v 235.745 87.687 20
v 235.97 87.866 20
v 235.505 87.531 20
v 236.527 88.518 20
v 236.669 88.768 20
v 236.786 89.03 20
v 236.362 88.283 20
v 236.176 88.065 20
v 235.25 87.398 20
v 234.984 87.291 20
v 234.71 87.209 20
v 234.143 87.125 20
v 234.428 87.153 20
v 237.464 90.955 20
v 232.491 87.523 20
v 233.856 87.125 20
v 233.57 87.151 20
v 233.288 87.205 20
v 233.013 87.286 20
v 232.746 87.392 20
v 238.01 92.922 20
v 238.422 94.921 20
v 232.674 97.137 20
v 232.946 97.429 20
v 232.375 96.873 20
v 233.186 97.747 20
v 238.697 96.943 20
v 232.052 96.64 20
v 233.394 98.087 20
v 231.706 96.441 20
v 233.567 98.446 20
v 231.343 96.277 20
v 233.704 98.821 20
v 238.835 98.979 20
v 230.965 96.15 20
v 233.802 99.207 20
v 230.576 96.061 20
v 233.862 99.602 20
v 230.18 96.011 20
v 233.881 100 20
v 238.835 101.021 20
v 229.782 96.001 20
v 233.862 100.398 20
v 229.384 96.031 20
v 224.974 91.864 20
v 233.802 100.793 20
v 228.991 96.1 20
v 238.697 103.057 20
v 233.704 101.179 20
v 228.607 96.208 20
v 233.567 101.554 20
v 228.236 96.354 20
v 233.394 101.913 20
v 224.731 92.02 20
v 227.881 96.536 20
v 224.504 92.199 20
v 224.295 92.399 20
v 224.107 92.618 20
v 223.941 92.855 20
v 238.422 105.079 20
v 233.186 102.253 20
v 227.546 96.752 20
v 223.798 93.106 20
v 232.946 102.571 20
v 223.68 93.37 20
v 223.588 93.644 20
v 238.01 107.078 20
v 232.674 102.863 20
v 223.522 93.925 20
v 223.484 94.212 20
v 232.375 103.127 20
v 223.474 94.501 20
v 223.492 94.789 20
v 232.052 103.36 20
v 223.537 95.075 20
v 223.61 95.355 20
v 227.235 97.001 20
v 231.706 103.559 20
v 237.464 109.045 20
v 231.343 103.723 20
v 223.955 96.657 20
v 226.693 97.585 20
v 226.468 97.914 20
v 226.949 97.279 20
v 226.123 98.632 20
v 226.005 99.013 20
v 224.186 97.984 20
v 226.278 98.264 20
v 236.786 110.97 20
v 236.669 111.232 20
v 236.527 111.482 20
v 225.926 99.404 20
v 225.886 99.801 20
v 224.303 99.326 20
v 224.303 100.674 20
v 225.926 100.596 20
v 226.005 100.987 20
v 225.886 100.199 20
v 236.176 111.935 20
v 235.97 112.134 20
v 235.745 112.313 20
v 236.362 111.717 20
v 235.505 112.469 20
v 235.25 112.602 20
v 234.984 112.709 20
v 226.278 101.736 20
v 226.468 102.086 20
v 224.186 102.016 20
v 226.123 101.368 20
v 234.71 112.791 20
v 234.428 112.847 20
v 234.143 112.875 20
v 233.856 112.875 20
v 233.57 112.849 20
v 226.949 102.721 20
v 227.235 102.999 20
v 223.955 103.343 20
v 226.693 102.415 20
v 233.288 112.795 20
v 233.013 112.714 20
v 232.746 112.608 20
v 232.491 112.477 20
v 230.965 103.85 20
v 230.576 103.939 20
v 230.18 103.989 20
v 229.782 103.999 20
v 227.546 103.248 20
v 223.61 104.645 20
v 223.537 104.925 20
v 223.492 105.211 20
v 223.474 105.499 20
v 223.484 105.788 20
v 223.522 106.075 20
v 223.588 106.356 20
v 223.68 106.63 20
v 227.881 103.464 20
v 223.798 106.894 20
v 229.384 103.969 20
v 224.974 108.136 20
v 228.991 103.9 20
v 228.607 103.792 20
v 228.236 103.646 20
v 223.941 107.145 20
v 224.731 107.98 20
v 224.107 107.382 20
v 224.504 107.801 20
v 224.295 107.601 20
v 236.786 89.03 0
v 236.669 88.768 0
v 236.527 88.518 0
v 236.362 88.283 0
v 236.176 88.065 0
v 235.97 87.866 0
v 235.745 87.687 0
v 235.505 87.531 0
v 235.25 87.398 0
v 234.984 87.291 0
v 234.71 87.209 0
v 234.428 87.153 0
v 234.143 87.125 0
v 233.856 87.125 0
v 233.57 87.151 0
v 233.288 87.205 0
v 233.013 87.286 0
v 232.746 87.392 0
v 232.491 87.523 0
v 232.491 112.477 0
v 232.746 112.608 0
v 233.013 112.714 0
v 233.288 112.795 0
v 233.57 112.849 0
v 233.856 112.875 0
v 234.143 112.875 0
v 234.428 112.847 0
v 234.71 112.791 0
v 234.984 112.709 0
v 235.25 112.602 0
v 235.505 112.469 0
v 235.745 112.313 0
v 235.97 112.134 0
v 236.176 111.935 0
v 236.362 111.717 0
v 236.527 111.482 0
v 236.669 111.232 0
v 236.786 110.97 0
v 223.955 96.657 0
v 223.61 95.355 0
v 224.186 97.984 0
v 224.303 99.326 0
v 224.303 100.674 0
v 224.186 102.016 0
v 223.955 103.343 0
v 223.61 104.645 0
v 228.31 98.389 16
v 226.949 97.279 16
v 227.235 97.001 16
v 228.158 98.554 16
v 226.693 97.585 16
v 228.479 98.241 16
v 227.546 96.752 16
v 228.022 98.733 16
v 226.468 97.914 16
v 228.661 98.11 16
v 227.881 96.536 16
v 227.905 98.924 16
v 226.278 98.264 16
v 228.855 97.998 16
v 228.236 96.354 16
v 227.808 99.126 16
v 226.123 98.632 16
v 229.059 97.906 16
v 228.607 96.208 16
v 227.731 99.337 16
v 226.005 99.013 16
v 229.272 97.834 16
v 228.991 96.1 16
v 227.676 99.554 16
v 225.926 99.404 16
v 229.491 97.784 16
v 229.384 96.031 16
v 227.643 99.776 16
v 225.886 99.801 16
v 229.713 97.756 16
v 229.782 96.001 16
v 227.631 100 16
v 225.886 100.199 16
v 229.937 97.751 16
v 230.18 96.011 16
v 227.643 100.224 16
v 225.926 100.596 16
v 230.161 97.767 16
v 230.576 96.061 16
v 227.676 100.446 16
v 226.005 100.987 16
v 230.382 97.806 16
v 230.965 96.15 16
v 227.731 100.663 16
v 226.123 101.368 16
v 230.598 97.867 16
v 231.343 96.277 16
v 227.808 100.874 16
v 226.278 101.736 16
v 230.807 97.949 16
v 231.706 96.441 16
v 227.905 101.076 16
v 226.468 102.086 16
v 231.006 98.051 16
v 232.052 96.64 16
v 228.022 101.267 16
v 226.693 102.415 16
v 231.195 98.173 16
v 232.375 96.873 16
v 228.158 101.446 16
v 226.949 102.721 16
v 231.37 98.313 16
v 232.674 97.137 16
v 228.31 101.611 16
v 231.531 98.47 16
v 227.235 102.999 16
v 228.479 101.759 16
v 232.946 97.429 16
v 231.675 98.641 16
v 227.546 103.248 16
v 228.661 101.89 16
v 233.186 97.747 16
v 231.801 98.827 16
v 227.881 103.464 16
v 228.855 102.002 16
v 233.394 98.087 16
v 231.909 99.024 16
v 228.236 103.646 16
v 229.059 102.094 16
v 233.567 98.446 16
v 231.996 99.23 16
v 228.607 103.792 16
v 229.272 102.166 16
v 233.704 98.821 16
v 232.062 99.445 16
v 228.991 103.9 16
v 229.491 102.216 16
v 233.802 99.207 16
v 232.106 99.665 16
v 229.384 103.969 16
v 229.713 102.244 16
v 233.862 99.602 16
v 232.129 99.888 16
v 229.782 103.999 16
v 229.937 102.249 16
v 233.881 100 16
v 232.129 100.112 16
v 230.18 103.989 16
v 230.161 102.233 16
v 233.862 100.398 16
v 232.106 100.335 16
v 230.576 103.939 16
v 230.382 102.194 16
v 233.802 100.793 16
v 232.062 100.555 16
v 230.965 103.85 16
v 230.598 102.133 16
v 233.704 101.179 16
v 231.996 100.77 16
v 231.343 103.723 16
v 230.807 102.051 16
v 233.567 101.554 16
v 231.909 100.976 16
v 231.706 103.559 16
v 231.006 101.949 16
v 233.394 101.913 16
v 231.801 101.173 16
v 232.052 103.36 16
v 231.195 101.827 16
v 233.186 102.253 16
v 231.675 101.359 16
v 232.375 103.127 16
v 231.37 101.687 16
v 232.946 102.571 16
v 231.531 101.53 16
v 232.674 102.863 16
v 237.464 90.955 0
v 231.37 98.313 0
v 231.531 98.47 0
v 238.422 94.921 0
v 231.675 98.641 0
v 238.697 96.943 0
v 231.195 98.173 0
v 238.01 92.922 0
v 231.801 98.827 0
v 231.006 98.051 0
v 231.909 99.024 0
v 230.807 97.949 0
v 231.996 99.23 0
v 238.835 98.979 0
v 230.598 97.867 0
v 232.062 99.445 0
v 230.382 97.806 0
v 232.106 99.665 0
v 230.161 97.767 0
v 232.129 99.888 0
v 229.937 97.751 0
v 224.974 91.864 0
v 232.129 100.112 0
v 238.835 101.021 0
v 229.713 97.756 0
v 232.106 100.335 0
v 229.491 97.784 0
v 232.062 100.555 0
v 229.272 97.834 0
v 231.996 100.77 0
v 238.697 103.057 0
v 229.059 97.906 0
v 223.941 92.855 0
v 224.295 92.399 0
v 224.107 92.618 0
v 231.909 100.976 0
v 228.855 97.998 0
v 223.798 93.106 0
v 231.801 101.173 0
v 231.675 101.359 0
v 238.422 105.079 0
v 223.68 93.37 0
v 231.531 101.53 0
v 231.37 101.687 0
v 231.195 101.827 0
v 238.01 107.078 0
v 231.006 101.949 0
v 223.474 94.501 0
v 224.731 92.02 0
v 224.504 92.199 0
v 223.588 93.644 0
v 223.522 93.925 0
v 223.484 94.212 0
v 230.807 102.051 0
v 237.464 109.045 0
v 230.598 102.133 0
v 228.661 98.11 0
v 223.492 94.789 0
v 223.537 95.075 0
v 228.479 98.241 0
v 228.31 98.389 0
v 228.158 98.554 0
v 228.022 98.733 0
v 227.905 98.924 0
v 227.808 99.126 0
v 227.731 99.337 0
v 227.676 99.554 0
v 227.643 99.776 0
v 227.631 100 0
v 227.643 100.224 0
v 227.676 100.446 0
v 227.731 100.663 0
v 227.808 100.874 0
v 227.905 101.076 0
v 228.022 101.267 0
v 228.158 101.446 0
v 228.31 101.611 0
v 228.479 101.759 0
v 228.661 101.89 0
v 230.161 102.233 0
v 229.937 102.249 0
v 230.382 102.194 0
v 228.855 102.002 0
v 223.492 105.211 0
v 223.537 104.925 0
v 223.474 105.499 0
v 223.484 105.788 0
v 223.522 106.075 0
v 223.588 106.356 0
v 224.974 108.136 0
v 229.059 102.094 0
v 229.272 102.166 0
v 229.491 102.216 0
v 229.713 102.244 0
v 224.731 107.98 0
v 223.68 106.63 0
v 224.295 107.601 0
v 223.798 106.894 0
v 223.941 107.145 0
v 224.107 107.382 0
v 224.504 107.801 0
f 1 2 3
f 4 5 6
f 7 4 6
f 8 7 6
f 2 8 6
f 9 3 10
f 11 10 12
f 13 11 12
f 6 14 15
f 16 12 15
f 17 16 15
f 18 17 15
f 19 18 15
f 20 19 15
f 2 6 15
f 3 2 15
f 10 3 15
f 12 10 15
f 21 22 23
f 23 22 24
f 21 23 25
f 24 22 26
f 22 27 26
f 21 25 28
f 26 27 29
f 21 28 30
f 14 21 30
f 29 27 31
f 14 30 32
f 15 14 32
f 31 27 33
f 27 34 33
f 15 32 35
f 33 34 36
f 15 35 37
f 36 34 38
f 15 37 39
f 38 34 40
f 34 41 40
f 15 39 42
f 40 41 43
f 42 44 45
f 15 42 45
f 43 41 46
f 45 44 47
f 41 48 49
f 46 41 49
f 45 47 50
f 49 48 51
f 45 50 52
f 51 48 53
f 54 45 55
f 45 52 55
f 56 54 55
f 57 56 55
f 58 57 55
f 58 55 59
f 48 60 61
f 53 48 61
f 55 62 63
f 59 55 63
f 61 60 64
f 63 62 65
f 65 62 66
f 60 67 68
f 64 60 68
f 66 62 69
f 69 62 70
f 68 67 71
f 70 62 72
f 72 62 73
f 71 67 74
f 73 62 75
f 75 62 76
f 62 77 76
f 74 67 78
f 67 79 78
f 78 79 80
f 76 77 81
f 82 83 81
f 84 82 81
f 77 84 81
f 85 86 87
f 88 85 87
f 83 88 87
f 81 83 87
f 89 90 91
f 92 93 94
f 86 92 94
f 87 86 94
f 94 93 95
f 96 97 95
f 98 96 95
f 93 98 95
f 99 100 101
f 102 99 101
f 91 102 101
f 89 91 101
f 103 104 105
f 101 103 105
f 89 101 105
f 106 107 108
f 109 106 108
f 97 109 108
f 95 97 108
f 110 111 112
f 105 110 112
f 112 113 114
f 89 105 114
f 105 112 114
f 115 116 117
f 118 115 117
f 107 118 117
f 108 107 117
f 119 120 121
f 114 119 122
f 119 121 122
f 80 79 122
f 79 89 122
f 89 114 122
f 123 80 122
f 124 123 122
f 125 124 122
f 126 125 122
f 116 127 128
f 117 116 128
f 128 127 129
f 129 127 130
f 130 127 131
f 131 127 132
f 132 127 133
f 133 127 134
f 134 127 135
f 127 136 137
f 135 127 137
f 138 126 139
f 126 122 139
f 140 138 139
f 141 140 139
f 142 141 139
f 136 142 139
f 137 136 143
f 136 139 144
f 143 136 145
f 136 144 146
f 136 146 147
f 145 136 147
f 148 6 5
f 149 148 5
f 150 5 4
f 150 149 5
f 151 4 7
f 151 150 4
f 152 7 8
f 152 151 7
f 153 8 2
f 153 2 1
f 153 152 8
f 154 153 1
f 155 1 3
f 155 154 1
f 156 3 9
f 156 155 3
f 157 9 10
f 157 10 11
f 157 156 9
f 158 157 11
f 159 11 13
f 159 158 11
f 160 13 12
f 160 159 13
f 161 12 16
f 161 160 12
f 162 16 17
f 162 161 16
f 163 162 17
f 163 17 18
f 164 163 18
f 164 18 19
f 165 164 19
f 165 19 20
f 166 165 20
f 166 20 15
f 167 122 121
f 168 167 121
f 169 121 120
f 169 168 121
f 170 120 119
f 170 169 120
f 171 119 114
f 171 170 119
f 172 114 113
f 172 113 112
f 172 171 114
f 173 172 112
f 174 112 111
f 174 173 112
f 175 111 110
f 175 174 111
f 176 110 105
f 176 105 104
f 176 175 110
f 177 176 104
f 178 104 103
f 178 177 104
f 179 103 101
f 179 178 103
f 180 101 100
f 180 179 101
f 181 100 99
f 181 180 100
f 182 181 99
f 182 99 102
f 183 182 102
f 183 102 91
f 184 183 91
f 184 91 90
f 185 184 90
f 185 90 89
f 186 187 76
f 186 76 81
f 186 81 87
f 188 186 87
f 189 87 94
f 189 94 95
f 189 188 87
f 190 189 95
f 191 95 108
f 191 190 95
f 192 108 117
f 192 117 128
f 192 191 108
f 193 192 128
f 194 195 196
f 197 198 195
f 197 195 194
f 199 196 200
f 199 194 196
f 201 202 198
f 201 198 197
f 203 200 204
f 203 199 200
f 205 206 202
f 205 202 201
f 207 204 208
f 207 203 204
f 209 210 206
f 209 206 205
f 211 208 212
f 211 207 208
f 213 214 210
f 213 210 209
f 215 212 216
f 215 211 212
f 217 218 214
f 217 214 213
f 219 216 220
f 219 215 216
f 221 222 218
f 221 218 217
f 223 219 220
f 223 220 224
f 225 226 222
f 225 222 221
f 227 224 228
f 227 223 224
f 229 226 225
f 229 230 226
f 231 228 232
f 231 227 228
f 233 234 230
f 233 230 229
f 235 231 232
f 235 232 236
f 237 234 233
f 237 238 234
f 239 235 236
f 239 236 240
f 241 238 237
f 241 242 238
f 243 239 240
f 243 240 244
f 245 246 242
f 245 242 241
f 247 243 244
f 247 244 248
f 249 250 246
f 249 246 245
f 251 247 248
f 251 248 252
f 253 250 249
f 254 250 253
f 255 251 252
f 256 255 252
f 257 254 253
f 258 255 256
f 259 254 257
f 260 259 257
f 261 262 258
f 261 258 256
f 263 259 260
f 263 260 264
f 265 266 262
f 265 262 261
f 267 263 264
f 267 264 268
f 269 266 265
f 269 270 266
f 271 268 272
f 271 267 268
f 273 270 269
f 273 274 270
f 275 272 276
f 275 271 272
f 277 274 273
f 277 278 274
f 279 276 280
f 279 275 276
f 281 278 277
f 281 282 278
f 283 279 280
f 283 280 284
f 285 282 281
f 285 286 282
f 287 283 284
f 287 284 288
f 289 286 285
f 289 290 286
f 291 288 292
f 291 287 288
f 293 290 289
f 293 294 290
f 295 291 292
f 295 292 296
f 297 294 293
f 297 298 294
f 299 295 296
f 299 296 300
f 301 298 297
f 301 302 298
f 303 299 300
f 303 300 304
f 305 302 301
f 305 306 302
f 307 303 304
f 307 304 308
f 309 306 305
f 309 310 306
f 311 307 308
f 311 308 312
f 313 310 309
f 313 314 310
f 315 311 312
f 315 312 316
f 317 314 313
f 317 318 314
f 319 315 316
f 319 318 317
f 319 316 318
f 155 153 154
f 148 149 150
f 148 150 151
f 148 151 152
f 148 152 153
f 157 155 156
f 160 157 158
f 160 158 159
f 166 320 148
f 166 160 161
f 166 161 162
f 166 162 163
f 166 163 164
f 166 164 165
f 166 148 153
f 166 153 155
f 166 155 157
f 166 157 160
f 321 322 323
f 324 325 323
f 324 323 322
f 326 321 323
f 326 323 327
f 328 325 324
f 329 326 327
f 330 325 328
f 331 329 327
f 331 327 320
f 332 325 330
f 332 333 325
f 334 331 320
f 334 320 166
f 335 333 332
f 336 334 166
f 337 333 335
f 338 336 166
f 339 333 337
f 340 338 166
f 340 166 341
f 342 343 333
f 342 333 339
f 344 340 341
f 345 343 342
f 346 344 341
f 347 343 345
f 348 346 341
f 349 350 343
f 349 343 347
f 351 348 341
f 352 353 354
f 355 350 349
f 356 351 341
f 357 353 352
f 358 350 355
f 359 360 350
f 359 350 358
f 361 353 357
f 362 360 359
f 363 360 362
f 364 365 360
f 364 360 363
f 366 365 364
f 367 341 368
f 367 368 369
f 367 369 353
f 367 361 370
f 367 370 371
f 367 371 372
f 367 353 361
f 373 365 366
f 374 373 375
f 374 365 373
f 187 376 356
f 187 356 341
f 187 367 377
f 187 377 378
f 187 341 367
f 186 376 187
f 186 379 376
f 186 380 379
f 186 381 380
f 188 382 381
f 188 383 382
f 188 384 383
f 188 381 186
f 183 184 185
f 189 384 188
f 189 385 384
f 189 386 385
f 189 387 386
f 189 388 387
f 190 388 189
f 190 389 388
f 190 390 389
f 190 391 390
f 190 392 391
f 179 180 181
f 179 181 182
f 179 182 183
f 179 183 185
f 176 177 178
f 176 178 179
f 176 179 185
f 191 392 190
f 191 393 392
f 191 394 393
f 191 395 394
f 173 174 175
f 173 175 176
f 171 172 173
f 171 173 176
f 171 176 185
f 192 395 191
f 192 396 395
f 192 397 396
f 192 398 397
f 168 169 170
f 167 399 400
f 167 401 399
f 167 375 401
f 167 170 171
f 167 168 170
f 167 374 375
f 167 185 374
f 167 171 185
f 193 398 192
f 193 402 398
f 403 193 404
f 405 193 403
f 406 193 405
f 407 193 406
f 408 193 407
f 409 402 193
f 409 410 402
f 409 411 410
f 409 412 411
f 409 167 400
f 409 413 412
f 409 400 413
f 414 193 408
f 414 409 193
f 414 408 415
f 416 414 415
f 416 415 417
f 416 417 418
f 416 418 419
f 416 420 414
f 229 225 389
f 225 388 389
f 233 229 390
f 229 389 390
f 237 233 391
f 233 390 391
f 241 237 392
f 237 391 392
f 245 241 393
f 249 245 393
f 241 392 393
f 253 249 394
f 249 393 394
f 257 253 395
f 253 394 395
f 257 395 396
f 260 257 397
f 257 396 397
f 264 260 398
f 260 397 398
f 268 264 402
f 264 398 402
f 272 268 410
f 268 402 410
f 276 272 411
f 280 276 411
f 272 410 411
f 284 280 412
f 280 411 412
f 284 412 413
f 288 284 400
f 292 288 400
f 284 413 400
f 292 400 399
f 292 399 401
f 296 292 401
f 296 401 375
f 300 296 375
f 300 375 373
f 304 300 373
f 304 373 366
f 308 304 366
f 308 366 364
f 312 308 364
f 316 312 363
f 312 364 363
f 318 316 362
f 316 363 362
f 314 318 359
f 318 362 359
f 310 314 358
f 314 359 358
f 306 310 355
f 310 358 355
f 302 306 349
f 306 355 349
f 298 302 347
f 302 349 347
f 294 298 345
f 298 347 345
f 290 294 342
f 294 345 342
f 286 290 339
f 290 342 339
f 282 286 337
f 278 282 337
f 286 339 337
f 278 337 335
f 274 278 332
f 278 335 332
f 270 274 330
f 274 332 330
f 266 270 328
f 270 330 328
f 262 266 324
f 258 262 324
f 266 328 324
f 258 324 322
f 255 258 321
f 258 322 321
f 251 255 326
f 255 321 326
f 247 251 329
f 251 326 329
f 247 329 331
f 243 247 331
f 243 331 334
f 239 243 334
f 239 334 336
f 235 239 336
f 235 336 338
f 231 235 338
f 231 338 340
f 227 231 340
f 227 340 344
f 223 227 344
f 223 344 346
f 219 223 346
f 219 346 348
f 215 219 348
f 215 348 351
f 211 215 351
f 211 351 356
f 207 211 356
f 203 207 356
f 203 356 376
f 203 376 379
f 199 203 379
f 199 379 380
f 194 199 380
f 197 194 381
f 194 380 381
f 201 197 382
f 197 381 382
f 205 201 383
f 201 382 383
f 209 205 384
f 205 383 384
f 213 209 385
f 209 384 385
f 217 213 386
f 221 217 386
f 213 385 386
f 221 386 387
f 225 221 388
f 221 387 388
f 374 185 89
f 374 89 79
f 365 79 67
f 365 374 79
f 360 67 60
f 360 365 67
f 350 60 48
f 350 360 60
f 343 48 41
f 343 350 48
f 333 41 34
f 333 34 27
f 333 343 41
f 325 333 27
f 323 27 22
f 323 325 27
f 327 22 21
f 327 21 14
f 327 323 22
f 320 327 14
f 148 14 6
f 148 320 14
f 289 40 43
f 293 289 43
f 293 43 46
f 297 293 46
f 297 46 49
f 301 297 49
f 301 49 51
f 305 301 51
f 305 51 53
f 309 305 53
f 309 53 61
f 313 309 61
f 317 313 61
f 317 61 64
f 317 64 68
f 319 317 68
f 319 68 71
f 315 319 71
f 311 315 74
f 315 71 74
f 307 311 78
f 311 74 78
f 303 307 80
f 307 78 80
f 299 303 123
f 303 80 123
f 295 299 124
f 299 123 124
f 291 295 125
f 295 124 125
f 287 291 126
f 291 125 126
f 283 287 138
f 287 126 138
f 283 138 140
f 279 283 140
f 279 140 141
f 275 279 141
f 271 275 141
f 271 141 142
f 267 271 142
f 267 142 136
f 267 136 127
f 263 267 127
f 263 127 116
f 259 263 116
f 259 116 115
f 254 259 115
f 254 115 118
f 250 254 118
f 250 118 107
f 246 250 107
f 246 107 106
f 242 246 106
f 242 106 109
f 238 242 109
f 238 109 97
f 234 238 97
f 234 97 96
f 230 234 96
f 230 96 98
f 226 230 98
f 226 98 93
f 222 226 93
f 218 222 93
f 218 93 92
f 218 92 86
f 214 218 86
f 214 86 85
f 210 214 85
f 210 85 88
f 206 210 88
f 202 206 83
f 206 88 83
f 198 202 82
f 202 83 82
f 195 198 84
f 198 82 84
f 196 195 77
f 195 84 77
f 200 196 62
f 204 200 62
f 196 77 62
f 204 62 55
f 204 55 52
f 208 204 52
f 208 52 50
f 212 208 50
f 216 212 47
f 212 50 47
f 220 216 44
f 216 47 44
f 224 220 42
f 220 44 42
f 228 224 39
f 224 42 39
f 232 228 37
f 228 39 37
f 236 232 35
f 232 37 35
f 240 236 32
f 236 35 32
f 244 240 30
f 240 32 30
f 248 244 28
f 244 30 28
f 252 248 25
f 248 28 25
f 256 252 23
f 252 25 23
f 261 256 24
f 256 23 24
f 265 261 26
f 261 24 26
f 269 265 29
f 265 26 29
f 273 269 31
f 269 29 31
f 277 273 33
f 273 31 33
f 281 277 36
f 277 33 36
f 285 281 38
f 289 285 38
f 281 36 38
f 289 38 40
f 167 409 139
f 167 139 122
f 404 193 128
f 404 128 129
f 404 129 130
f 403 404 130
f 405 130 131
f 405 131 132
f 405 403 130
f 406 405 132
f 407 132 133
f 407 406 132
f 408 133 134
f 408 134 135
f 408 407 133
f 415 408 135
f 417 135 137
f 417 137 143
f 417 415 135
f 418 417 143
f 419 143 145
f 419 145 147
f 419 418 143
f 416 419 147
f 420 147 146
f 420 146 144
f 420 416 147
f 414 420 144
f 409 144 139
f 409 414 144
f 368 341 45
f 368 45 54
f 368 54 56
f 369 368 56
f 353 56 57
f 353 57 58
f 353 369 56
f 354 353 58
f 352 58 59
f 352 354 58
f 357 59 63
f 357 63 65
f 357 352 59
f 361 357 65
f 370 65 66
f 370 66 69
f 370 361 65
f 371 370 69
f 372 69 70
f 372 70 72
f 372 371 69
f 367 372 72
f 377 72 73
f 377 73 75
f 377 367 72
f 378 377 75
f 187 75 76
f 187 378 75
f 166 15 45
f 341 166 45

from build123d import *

# Parameters (mm, degrees)
RESSALTO_EXTRUS_O1_DEPTH          = 20
REBAIXO_PARA_SHCS_M41_D           = 4.5
REBAIXO_PARA_SHCS_M41_CBORE_D     = 8
REBAIXO_PARA_SHCS_M41_CBORE_DEPTH = 4


with BuildPart() as part:
    # Esboço1 → Ressalto-extrusão1 (new body)
    with BuildSketch(Plane.XY):
        with BuildLine():
            Line((224.973932781, 108.136324985), (232.491448563, 112.476564746))
            ThreePointArc((232.491448563, 112.476564746), (234.984464913, 112.709375061), (236.785753669, 110.970211474))
            ThreePointArc((236.785753669, 110.970211474), (238.85268513, 100), (236.785753669, 89.029788526))
            ThreePointArc((236.785753669, 89.029788526), (234.984464913, 87.290624939), (232.491448563, 87.523435254))
            Line((232.491448563, 87.523435254), (224.973932781, 91.863675015))
            ThreePointArc((224.973932781, 91.863675015), (223.679685252, 93.369880929), (223.609856165, 95.354536271))
            ThreePointArc((223.609856165, 95.354536271), (224.317111682, 100), (223.609856165, 104.645463729))
            ThreePointArc((223.609856165, 104.645463729), (223.679685252, 106.630119071), (224.973932781, 108.136324985))
        make_face()
    extrude(amount=RESSALTO_EXTRUS_O1_DEPTH)

    # Rebaixo para SHCS M41 (through all)
    with Locations(Plane.XY.offset(20)):
        with Locations((229.88140452, 100)):
            CounterBoreHole(REBAIXO_PARA_SHCS_M41_D / 2, REBAIXO_PARA_SHCS_M41_CBORE_D / 2, REBAIXO_PARA_SHCS_M41_CBORE_DEPTH)


solid = part.part
